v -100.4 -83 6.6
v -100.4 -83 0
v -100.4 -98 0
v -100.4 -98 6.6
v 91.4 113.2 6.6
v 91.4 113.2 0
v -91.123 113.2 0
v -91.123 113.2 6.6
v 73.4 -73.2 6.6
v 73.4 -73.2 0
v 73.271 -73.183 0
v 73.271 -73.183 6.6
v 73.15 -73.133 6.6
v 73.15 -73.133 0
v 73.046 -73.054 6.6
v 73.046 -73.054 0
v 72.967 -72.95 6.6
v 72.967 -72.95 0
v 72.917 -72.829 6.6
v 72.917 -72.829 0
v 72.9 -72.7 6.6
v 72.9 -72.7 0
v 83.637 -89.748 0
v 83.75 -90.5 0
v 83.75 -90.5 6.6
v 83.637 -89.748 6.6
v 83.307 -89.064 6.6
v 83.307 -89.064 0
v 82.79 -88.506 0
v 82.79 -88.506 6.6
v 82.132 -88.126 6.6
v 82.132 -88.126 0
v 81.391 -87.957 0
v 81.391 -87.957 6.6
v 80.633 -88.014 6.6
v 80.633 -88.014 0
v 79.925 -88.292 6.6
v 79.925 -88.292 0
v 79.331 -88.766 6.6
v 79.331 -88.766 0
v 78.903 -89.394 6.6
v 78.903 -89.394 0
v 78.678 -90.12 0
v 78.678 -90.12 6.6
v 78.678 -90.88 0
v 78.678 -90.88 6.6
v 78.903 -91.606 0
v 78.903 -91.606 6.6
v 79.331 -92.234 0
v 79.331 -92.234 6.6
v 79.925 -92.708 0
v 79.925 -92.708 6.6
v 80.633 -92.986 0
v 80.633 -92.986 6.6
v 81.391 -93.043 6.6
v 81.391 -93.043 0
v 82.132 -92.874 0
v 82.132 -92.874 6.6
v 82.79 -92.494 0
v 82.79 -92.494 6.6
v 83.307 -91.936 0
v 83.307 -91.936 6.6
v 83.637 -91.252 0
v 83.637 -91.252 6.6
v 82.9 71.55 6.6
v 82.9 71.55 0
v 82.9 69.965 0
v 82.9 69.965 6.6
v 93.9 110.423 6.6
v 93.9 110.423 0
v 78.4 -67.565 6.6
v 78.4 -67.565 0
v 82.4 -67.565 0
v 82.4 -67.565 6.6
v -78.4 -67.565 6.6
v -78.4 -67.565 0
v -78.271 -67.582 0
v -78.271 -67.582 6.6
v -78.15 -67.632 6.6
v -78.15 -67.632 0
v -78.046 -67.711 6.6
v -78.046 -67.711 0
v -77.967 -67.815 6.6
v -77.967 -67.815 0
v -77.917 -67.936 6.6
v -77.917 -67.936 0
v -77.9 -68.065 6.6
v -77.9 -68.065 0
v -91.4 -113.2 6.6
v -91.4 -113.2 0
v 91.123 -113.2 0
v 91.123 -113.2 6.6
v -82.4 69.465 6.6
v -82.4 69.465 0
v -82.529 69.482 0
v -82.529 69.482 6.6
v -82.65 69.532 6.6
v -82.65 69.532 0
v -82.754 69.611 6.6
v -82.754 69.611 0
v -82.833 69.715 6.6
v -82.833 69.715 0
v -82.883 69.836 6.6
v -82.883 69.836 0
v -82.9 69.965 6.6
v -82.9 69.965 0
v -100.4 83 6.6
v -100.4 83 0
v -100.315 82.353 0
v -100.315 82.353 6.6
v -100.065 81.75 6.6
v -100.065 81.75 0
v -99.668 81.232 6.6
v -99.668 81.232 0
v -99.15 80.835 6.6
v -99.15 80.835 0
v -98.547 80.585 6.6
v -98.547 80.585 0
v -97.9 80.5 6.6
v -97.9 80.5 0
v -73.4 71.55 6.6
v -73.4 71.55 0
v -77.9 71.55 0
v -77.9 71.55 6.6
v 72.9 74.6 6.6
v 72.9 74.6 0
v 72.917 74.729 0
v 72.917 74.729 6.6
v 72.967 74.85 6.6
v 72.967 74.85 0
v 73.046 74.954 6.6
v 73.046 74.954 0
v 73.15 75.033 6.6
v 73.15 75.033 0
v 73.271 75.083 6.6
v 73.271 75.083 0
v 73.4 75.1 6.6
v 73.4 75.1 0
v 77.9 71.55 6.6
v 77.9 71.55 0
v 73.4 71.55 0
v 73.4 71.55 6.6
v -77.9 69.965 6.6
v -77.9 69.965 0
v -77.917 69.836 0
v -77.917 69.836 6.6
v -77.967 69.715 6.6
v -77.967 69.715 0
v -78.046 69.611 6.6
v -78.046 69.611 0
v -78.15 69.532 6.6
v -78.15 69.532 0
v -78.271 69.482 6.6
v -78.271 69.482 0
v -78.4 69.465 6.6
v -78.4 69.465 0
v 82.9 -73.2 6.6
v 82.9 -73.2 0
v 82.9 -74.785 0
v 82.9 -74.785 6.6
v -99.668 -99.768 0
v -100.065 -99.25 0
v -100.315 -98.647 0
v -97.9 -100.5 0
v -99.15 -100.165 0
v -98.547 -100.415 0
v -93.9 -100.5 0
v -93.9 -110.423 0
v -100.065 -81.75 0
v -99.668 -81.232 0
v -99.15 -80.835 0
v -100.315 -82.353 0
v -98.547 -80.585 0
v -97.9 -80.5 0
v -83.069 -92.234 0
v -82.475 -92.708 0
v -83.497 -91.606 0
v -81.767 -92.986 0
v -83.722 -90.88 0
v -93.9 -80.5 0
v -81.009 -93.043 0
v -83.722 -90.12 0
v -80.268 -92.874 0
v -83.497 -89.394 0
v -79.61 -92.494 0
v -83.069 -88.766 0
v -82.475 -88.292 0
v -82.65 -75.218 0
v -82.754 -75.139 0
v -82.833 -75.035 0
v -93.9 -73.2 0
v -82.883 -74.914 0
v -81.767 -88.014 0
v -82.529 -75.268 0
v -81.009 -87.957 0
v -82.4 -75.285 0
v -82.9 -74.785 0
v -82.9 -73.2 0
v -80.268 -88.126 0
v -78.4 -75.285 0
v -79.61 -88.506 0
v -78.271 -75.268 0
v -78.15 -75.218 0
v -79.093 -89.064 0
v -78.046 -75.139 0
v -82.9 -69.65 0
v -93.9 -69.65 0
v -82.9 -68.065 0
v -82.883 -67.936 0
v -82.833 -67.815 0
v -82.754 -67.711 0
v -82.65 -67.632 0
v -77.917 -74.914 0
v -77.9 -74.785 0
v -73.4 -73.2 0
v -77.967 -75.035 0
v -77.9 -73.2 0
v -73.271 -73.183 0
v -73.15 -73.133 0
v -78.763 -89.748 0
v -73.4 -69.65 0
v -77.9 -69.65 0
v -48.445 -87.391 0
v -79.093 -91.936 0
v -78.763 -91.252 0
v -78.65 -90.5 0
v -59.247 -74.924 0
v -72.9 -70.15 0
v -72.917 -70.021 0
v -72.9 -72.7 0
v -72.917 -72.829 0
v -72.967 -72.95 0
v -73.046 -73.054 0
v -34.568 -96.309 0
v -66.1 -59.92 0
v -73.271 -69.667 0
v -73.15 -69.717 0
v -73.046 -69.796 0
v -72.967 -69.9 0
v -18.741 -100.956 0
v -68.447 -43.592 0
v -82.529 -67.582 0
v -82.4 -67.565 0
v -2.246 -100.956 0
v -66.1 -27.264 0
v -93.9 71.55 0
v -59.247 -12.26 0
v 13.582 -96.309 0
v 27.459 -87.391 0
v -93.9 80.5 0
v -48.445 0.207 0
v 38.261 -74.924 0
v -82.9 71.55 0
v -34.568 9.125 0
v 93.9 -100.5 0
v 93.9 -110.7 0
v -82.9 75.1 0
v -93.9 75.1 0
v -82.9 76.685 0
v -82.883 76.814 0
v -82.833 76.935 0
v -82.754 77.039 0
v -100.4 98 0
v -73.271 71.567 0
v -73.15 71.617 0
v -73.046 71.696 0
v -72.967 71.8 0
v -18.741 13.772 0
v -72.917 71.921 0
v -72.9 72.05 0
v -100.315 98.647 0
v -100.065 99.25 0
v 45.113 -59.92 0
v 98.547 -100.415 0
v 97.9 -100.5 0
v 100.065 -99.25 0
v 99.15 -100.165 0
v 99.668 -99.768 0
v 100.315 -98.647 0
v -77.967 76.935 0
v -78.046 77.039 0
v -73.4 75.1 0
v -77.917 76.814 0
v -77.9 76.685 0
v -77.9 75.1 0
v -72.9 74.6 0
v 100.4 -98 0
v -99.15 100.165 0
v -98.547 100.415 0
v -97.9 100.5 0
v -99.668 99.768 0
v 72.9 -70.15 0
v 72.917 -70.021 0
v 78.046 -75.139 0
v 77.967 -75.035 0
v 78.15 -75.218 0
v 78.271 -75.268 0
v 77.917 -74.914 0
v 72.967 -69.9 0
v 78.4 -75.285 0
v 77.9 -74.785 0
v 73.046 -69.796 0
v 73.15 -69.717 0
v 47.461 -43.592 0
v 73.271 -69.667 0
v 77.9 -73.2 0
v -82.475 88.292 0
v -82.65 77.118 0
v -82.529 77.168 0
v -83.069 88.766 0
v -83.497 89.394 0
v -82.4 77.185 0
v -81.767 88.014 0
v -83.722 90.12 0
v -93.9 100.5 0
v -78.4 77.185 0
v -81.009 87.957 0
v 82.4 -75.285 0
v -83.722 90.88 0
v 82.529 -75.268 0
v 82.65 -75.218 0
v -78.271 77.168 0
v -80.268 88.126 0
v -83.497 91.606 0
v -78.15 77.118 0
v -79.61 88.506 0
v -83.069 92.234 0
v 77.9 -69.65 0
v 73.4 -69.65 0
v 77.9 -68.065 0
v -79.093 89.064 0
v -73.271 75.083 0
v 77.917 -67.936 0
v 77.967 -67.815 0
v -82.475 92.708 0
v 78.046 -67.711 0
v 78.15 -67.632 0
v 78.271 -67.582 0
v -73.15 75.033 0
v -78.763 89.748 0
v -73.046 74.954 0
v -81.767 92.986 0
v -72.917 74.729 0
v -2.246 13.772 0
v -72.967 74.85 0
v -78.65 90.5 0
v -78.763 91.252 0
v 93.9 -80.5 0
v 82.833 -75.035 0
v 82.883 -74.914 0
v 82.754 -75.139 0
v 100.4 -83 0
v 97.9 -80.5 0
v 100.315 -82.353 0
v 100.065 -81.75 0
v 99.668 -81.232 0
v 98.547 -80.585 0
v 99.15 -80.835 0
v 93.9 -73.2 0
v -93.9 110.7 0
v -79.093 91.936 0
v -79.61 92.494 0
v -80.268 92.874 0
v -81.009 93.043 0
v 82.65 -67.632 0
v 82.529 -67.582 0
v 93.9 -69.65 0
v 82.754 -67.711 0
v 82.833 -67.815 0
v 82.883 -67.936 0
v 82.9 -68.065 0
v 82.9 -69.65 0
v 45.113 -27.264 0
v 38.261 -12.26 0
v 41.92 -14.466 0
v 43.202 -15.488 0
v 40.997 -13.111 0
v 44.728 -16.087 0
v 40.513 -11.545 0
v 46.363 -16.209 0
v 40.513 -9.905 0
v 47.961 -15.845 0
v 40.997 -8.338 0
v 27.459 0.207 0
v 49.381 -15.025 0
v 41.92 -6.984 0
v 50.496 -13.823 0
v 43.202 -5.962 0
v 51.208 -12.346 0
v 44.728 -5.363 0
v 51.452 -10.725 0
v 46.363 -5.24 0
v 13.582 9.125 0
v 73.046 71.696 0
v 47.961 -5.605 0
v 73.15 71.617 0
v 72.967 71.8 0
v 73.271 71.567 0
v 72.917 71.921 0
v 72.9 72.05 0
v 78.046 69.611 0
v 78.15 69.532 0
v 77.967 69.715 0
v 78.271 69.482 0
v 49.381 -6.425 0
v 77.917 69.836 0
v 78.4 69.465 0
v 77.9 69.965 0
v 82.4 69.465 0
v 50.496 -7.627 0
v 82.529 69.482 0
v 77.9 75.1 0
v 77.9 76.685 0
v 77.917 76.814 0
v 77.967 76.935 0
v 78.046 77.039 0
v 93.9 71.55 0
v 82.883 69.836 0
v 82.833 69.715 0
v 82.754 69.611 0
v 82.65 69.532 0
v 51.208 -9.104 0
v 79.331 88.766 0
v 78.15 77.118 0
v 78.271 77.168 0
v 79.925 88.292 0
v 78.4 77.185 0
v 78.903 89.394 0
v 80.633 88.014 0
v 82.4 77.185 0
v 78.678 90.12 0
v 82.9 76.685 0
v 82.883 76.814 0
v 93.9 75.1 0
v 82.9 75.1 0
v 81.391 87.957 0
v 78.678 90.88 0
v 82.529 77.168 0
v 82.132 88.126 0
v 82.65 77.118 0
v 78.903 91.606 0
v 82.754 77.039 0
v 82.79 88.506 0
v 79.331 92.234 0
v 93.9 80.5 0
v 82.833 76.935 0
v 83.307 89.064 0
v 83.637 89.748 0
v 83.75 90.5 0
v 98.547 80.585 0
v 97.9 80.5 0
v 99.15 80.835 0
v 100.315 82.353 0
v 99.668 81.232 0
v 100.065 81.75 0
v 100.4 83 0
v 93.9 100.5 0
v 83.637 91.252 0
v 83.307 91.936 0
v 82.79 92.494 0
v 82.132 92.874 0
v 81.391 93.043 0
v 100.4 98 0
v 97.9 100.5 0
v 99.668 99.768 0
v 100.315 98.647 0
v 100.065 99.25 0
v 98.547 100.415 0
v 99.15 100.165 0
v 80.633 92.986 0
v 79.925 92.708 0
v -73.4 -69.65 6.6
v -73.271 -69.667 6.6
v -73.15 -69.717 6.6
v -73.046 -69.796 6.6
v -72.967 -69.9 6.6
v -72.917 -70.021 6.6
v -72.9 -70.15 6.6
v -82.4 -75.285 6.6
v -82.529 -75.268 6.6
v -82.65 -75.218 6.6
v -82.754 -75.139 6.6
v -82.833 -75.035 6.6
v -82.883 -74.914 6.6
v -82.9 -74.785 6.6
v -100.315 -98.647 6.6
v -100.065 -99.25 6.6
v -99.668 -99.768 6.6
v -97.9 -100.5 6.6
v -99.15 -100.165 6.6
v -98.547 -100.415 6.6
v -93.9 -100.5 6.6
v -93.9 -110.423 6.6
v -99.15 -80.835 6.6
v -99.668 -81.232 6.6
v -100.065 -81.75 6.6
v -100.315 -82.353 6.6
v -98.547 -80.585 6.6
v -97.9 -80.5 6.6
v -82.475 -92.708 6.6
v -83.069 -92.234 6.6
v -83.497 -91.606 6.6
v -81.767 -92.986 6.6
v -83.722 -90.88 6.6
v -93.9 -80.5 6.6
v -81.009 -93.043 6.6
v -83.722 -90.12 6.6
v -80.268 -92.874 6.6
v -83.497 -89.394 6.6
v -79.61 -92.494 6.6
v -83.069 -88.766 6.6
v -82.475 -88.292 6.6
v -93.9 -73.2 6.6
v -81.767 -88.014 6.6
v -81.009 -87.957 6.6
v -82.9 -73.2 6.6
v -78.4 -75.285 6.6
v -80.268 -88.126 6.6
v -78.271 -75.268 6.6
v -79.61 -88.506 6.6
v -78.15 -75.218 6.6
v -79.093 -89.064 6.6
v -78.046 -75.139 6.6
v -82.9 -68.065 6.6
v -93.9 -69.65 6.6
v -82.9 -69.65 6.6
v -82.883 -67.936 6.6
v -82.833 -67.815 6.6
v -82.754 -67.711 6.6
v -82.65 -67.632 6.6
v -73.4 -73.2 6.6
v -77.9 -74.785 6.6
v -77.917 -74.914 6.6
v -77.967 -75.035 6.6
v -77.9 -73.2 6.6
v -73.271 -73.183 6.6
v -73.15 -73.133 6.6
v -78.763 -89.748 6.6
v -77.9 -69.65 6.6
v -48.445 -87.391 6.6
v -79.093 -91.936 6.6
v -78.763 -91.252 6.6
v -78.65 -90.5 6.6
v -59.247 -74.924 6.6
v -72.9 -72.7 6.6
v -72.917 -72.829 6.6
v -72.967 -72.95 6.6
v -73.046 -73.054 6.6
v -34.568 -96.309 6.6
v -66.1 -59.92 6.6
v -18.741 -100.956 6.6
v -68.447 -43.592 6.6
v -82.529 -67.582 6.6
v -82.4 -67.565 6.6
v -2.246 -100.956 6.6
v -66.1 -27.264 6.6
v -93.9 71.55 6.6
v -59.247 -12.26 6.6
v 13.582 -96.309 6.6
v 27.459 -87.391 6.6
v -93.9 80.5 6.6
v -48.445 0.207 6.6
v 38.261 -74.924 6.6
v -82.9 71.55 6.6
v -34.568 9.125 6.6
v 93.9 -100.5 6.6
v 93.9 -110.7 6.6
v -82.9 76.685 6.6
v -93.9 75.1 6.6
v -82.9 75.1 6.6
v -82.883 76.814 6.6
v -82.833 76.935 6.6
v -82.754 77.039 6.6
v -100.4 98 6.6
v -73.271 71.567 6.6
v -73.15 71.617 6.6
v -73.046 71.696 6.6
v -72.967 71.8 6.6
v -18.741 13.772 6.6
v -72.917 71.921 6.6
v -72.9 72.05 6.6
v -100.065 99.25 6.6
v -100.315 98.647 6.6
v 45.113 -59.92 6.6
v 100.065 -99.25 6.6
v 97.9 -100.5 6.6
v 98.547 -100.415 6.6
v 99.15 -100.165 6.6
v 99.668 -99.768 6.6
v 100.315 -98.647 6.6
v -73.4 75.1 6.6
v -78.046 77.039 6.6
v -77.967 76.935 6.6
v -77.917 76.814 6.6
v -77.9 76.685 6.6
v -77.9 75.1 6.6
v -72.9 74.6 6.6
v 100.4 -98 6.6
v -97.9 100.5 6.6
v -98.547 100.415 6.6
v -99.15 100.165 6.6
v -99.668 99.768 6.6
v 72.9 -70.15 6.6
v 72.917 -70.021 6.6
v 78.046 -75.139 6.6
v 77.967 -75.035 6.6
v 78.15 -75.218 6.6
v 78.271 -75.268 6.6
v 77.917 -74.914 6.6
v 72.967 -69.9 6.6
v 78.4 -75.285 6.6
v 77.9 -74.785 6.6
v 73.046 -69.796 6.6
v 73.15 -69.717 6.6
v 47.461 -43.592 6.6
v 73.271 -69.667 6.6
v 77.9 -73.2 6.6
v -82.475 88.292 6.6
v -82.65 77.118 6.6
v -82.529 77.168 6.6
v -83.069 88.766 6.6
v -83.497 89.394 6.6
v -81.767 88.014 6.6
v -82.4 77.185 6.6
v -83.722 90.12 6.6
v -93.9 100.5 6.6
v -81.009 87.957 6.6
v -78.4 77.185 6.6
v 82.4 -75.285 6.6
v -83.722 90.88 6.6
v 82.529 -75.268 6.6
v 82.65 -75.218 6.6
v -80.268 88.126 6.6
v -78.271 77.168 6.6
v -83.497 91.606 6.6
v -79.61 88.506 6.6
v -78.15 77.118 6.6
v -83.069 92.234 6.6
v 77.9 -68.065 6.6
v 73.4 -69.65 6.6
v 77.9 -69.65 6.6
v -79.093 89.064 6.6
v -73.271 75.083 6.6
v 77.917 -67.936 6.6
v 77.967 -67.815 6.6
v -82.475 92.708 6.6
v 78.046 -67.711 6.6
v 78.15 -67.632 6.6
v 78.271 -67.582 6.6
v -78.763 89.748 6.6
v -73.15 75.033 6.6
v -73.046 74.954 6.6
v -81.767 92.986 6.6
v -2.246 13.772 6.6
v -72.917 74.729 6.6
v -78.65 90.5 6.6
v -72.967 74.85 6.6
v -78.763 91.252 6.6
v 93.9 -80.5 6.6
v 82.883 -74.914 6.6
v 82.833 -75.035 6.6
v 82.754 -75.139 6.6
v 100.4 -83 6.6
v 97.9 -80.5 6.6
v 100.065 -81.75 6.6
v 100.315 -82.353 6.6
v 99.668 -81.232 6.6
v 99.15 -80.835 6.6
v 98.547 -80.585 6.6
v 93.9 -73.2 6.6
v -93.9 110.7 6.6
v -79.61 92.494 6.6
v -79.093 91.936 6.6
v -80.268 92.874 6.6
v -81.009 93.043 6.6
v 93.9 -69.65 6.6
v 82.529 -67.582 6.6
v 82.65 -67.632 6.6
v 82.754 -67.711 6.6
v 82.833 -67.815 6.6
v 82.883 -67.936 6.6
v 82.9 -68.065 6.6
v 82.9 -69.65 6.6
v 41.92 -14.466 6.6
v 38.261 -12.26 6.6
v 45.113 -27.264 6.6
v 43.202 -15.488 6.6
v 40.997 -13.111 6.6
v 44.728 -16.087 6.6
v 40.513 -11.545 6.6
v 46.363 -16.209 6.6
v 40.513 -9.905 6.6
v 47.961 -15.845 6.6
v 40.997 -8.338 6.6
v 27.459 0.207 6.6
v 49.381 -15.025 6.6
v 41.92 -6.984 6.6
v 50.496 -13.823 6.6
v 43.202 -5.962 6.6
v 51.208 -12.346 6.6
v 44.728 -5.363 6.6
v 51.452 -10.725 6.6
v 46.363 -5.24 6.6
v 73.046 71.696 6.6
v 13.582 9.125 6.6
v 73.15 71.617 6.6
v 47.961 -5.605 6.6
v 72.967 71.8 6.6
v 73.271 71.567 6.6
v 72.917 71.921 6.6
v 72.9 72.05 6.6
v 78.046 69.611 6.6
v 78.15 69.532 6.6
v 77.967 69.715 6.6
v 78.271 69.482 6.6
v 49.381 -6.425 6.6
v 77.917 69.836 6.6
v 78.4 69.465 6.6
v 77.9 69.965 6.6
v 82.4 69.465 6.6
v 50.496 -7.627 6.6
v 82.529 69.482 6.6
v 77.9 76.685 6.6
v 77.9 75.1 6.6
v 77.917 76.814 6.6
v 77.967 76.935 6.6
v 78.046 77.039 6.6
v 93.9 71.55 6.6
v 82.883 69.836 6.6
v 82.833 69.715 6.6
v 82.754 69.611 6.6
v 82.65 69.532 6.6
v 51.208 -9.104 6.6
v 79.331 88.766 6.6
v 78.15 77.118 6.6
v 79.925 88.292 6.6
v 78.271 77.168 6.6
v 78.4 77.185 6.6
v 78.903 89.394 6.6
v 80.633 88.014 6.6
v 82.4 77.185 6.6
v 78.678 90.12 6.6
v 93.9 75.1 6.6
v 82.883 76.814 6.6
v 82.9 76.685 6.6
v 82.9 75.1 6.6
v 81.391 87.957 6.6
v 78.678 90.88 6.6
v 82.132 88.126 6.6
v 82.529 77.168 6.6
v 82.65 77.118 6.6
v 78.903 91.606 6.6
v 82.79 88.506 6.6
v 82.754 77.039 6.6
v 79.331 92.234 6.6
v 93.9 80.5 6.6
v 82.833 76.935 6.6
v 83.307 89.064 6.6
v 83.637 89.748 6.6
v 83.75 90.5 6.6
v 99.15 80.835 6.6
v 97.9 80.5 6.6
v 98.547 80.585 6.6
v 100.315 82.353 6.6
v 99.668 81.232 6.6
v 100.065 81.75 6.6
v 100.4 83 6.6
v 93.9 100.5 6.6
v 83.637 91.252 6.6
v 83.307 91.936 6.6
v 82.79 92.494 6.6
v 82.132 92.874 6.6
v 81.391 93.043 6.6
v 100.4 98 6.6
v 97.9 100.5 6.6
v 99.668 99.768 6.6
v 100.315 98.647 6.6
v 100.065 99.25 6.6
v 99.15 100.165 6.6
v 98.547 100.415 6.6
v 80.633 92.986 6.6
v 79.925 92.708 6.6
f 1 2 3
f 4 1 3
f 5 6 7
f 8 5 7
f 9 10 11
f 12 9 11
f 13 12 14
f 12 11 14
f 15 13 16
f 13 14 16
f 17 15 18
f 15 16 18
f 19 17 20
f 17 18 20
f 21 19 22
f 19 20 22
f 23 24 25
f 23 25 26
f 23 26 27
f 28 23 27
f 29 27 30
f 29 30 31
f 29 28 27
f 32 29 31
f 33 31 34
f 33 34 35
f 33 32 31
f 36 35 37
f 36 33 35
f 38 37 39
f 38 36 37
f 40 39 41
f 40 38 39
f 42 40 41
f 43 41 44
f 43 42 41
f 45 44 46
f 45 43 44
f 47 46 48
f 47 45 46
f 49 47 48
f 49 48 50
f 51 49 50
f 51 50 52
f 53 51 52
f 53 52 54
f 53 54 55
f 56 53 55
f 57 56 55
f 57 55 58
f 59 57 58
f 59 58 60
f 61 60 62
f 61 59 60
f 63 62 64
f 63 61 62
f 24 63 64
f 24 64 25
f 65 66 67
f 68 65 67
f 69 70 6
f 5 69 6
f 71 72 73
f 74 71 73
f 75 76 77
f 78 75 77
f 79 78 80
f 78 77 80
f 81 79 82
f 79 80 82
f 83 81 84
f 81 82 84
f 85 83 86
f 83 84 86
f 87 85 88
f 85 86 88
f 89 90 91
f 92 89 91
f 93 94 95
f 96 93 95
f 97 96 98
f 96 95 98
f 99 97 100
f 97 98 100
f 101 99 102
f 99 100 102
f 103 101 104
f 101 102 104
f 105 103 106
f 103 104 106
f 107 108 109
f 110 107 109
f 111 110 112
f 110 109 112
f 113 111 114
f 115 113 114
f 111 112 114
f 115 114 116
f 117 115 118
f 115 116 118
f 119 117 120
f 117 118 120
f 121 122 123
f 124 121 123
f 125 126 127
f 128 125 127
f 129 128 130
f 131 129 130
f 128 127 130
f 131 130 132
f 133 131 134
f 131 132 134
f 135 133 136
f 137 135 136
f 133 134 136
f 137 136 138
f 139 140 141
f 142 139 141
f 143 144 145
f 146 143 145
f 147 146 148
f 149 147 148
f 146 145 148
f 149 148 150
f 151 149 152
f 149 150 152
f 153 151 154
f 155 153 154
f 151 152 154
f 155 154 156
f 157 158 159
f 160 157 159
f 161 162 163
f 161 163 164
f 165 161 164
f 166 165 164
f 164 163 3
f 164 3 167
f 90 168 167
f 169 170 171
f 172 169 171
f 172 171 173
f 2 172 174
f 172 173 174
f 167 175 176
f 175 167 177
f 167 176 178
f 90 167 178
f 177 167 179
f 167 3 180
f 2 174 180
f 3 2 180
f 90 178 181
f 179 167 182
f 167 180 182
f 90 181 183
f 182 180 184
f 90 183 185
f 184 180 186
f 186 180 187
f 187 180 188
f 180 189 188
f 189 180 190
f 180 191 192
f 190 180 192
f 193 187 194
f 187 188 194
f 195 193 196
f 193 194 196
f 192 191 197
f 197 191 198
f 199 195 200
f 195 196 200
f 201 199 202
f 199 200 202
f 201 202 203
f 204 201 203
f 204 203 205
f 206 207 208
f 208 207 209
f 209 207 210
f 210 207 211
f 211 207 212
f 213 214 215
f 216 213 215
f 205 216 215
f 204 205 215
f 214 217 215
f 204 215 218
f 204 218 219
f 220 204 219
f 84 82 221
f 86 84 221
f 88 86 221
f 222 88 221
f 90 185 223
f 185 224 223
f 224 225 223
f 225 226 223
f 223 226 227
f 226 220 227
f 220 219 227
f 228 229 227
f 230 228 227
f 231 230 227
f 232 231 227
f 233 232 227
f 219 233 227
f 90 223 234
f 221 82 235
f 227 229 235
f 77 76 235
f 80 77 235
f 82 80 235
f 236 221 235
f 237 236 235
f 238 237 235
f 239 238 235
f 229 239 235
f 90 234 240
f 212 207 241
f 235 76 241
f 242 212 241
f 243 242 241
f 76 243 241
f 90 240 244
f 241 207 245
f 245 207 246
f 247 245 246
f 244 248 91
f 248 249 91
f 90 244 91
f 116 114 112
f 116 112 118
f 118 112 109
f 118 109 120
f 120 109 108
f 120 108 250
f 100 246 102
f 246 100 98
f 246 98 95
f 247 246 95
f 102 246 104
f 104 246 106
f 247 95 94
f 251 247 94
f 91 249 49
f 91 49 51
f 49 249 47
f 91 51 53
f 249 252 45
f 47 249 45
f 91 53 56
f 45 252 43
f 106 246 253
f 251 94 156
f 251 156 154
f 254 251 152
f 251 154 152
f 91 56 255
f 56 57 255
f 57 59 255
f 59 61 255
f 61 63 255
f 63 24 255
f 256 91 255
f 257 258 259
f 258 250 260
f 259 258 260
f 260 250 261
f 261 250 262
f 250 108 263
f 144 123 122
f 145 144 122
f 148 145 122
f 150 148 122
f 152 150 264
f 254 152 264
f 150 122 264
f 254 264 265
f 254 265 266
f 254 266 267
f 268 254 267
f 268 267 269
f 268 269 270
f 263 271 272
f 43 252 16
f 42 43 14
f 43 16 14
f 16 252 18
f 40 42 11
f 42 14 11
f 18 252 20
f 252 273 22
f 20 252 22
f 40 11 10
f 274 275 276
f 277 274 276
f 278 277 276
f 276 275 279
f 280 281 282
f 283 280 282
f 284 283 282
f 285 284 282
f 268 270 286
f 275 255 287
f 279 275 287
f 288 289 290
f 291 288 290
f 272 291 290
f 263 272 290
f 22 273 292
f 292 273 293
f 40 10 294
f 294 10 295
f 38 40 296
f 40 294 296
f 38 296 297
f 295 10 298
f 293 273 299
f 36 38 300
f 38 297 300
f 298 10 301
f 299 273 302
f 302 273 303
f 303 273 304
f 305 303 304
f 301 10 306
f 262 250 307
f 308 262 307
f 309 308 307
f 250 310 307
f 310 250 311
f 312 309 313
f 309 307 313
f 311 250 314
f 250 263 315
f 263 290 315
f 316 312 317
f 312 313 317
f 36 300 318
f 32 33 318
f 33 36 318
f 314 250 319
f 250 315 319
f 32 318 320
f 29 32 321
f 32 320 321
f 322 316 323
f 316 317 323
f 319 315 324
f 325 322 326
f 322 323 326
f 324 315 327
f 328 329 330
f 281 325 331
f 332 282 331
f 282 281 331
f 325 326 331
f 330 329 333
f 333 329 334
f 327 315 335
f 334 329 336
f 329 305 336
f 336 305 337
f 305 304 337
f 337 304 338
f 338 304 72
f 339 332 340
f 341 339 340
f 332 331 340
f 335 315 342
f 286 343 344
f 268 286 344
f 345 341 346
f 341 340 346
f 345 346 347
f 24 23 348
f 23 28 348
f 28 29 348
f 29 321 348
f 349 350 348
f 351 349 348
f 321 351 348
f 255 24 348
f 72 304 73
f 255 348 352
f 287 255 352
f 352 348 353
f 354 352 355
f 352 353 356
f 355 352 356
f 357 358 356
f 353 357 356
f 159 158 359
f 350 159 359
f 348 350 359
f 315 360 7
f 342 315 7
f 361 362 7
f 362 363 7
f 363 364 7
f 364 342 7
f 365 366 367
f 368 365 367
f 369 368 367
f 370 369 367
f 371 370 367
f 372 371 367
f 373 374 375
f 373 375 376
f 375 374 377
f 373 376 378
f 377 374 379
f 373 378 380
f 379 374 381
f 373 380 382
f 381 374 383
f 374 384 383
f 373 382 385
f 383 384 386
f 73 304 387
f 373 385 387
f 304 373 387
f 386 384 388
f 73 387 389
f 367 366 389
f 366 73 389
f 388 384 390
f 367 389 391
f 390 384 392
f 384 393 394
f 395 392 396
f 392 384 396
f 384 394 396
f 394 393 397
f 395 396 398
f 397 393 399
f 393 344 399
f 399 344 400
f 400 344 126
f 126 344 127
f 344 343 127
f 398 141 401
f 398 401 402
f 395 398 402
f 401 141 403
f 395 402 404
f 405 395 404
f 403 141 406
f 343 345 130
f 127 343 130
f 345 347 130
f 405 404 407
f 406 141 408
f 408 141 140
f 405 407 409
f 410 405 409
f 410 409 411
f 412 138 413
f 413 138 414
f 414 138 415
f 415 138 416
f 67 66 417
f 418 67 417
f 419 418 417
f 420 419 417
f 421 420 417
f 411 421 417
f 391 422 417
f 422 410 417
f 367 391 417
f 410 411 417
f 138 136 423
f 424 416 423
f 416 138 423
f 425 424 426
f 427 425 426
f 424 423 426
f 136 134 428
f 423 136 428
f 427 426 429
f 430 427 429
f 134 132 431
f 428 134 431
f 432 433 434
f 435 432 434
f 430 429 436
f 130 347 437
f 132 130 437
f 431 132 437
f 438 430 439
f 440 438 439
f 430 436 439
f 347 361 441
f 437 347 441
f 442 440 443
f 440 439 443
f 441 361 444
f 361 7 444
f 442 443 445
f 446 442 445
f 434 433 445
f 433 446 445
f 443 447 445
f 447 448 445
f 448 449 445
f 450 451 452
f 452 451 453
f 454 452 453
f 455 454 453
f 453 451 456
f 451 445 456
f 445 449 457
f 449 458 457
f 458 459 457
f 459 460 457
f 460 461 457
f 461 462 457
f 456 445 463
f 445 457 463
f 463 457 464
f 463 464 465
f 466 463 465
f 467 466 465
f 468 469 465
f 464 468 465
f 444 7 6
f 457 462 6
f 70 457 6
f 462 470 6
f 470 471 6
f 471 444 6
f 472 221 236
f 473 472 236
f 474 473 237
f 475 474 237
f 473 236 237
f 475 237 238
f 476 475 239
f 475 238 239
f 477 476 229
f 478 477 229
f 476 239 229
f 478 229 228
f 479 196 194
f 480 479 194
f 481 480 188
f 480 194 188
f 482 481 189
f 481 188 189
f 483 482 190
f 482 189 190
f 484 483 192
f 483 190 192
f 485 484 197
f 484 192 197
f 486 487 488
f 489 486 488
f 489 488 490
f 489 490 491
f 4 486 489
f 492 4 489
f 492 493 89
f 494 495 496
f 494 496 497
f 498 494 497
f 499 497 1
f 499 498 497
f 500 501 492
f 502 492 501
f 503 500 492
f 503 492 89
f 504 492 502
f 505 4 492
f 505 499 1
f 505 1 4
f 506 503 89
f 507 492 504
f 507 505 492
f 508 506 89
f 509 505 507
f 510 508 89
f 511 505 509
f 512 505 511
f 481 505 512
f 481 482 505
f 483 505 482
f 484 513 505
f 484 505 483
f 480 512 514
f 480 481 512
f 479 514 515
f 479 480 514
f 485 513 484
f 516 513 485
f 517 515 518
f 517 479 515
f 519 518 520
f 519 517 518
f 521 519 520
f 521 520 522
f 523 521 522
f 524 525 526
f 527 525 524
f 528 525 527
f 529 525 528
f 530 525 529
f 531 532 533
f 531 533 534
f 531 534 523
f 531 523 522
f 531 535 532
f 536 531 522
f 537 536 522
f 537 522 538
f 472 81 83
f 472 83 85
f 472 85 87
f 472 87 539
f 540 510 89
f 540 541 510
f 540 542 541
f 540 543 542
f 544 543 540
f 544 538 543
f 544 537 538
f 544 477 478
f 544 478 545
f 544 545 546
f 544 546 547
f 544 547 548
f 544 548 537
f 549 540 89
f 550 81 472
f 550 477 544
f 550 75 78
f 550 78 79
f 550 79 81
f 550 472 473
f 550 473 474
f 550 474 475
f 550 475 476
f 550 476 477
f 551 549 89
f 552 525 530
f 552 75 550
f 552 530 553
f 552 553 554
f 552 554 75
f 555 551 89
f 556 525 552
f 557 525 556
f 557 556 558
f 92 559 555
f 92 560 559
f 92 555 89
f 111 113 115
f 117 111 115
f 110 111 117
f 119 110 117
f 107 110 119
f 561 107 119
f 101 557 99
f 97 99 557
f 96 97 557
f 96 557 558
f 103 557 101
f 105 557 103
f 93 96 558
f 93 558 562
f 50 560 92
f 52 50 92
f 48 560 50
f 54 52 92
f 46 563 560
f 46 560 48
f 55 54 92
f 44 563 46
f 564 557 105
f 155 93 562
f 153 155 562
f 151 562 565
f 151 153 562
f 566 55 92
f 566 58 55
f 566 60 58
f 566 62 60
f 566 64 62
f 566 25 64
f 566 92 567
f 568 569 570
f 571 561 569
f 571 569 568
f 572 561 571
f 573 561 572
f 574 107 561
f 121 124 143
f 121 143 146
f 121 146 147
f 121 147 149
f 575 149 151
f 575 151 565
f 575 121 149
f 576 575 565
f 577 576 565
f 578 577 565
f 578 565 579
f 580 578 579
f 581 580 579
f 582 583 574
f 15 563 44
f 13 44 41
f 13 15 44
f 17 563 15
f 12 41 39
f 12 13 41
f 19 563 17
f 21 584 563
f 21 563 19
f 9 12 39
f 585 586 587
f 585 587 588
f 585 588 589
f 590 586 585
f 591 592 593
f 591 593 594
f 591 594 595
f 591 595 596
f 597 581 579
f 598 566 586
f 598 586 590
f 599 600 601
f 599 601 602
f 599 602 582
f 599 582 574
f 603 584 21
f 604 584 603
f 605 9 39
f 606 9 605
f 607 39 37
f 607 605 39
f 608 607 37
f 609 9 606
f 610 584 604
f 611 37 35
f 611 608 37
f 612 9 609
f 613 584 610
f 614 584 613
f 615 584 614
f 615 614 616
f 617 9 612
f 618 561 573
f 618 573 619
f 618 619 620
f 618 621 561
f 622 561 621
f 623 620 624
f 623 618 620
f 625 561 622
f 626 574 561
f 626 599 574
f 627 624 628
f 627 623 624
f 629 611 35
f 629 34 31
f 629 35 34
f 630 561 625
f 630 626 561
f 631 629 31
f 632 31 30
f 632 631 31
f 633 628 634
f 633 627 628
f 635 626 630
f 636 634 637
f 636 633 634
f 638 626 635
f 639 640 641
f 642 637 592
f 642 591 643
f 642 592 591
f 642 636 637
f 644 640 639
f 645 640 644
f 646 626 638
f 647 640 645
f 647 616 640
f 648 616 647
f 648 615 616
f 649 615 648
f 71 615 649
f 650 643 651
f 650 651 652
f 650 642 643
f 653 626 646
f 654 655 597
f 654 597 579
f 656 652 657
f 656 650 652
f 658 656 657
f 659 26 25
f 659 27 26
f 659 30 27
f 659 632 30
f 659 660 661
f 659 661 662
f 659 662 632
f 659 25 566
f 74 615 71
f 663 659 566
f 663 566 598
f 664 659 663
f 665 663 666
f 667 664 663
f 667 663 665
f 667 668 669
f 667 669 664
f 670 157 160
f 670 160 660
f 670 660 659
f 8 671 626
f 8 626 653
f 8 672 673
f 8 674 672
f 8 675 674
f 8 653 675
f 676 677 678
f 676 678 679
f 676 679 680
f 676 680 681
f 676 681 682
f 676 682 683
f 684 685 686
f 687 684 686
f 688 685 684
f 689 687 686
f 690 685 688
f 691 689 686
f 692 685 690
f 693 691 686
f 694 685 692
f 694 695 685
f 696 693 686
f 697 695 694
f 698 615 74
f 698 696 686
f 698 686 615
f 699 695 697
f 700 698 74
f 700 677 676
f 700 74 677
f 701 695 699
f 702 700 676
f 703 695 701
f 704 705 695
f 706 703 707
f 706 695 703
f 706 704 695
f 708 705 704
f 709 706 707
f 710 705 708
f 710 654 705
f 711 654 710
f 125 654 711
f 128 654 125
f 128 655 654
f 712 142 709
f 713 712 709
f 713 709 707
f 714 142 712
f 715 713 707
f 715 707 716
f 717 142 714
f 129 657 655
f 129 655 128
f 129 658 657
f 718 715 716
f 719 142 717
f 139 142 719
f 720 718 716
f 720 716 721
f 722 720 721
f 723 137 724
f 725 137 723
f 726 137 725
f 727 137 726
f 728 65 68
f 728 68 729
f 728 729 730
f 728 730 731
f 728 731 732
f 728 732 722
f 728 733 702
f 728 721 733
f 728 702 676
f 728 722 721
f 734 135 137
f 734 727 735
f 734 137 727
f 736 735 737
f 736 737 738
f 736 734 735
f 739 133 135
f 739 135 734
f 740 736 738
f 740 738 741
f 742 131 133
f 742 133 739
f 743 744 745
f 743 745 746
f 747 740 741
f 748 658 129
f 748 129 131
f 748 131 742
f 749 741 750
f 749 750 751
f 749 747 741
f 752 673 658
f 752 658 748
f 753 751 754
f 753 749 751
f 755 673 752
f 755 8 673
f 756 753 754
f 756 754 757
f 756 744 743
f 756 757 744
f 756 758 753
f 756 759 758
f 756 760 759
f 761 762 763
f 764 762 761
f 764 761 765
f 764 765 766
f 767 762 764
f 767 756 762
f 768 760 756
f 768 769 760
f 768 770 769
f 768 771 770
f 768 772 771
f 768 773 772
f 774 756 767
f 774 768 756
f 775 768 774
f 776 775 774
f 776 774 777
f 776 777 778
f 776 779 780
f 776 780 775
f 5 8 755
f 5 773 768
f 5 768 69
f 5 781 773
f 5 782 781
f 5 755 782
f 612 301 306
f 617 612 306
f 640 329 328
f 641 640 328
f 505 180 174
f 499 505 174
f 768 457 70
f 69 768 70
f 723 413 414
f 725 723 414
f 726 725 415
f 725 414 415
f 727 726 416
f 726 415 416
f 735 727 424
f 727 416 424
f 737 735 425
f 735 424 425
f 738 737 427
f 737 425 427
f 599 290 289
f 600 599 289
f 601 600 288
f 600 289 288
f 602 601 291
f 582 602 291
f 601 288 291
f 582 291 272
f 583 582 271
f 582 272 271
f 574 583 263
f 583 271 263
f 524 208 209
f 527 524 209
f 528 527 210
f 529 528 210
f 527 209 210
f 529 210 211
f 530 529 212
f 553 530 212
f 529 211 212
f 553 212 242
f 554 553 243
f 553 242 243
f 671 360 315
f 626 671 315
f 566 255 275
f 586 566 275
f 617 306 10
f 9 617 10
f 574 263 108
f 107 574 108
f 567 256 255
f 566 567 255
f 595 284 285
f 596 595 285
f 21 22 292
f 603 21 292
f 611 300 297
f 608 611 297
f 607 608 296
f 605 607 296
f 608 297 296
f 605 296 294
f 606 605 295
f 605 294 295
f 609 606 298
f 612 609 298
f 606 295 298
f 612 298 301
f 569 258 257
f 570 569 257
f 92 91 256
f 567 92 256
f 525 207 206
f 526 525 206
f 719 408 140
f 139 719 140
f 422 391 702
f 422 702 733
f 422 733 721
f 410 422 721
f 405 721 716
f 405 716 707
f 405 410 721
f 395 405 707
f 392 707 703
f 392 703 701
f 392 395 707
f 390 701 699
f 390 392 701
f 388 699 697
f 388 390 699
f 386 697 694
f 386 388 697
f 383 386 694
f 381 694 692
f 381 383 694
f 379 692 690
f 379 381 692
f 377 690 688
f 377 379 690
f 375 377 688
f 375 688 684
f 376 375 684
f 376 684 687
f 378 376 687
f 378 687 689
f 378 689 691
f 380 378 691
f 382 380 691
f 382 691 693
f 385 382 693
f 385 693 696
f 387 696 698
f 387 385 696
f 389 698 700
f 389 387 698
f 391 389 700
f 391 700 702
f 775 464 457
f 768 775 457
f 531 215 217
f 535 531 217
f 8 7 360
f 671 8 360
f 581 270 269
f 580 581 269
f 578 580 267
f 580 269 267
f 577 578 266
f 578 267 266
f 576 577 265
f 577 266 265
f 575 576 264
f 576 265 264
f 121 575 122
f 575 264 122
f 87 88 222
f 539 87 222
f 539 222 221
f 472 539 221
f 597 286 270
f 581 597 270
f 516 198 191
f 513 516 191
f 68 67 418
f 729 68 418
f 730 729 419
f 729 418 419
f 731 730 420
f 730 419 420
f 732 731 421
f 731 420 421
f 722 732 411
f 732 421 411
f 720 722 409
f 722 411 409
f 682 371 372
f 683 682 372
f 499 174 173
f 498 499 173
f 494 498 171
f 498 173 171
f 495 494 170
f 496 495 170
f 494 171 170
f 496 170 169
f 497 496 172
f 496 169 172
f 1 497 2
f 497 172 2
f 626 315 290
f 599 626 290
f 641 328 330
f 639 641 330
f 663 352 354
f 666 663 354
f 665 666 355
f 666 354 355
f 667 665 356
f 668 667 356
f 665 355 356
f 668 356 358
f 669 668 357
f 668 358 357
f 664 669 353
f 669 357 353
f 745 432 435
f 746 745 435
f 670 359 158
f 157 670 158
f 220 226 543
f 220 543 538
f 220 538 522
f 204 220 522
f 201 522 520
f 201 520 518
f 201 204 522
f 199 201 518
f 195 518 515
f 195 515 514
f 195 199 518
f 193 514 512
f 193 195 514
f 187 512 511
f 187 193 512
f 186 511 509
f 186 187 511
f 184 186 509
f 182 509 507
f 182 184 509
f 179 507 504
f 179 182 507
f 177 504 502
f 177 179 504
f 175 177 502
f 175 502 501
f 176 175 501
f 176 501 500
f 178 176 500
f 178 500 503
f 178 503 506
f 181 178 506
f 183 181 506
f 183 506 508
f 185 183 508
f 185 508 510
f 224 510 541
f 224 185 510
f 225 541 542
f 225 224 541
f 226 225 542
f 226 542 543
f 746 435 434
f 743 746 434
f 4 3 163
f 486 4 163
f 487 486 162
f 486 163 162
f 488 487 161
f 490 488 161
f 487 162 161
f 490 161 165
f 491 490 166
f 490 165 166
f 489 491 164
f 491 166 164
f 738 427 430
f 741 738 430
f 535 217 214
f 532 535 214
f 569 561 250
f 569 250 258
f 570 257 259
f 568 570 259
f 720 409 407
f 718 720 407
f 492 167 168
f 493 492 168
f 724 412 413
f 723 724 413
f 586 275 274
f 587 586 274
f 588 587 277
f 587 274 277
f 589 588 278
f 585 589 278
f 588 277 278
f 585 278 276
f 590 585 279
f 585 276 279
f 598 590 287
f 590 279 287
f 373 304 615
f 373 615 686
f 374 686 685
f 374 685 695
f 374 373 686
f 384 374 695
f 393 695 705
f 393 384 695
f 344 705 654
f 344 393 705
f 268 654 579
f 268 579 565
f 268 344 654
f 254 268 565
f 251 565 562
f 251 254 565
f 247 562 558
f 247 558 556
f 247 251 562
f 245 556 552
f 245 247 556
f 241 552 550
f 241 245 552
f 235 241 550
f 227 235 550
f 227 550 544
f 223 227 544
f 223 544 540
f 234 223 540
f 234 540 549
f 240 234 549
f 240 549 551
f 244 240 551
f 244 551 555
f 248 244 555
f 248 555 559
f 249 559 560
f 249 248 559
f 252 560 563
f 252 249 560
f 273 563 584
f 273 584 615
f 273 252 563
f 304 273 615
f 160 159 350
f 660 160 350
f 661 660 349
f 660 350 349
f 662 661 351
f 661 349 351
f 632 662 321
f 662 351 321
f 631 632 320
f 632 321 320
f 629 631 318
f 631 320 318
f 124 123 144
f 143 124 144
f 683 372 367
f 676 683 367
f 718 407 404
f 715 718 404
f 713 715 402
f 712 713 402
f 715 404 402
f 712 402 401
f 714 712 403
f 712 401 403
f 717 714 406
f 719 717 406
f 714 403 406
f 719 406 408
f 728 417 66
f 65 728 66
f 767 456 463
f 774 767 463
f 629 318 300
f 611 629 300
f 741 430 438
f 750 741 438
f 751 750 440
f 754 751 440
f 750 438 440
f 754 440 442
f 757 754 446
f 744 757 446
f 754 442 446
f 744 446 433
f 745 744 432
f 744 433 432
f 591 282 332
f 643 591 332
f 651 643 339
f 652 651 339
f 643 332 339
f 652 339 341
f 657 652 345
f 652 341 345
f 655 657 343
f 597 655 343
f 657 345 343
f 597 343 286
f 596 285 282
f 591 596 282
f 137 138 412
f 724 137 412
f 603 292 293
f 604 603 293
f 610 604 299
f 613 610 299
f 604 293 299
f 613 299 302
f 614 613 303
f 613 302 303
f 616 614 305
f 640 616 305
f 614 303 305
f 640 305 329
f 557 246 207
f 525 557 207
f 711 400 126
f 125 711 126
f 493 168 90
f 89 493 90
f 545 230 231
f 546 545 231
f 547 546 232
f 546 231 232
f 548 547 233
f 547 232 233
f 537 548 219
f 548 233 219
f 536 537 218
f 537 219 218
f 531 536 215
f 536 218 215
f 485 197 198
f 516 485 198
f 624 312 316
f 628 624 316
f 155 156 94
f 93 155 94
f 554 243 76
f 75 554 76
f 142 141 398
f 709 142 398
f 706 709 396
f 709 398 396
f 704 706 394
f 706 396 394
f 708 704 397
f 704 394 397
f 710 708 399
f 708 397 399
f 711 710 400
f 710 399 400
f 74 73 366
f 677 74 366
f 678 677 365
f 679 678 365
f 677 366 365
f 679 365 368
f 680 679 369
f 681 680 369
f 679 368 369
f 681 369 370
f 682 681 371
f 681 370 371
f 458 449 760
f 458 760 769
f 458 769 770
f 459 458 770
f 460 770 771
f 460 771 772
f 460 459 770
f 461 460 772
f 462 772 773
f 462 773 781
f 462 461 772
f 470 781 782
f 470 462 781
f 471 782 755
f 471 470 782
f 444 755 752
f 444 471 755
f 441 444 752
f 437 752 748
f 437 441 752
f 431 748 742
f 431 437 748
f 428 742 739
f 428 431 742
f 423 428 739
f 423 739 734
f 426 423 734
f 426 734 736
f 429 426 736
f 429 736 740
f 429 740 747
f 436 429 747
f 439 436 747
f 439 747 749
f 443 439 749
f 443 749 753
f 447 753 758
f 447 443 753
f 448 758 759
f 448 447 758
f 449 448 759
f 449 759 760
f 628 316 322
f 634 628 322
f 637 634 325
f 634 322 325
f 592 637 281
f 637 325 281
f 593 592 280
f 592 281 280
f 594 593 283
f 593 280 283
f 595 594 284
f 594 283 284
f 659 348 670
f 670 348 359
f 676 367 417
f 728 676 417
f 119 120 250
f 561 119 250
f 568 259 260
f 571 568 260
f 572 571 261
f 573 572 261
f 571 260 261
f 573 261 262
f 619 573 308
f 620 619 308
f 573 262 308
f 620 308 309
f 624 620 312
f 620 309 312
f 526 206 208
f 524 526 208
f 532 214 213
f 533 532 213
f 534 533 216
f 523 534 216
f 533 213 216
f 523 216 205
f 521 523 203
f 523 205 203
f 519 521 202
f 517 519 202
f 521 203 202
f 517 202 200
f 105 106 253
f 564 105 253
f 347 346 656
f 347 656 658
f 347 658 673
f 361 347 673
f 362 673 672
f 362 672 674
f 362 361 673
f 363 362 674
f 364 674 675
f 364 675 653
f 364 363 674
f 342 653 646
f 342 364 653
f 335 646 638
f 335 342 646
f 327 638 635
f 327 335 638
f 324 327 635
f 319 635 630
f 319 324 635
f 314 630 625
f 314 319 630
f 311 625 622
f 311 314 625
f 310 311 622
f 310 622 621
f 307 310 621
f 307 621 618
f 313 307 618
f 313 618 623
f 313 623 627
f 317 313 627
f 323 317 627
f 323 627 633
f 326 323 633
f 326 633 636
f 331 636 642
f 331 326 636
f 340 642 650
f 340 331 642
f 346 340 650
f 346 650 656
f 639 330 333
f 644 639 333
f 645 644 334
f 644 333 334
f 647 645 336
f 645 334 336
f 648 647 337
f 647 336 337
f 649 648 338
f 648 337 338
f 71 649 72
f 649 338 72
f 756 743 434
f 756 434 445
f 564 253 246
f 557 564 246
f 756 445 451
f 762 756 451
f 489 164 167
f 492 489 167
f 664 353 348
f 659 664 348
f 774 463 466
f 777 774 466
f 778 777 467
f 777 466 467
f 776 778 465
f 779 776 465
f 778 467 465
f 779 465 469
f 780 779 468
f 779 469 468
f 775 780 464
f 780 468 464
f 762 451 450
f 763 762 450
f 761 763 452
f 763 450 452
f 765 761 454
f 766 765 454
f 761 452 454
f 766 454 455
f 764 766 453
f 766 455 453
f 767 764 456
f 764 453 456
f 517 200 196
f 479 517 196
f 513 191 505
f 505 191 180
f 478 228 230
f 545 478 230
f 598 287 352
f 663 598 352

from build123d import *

# Parameters (mm, degrees)
MODEL_R             = 57.954171366
MODEL_R_2           = 2.55
MODEL_R_3           = 5.5
BOSS_EXTRUDE1_DEPTH = 6.6


with BuildPart() as part:
    # Model → Boss-Extrude1 (new body)
    with BuildSketch(Plane.XY):
        with BuildLine():
            Line((93.9, 110.423468713), (91.4, 113.2))
            Line((91.4, 113.2), (-91.123468713, 113.2))
            Line((-91.123468713, 113.2), (-93.9, 110.7))
            Line((-93.9, 110.7), (-93.9, 100.5))
            Line((-93.9, 100.5), (-97.9, 100.5))
            ThreePointArc((-97.9, 100.5), (-99.667766953, 99.767766953), (-100.4, 98))
            Line((-100.4, 98), (-100.4, 83))
            ThreePointArc((-100.4, 83), (-99.667766953, 81.232233047), (-97.9, 80.5))
            Line((-97.9, 80.5), (-93.9, 80.5))
            Line((-93.9, 80.5), (-93.9, 75.1))
            Line((-93.9, 75.1), (-82.9, 75.1))
            Line((-82.9, 75.1), (-82.9, 76.685))
            ThreePointArc((-82.9, 76.685), (-82.753553391, 77.038553391), (-82.4, 77.185))
            Line((-82.4, 77.185), (-78.4, 77.185))
            ThreePointArc((-78.4, 77.185), (-78.046446609, 77.038553391), (-77.9, 76.685))
            Line((-77.9, 76.685), (-77.9, 75.1))
            Line((-77.9, 75.1), (-73.4, 75.1))
            ThreePointArc((-73.4, 75.1), (-73.046446609, 74.953553391), (-72.9, 74.6))
            Line((-72.9, 74.6), (-72.9, 72.05))
            ThreePointArc((-72.9, 72.05), (-73.046446609, 71.696446609), (-73.4, 71.55))
            Line((-73.4, 71.55), (-77.9, 71.55))
            Line((-77.9, 71.55), (-77.9, 69.965))
            ThreePointArc((-77.9, 69.965), (-78.046446609, 69.611446609), (-78.4, 69.465))
            Line((-78.4, 69.465), (-82.4, 69.465))
            ThreePointArc((-82.4, 69.465), (-82.753553391, 69.611446609), (-82.9, 69.965))
            Line((-82.9, 69.965), (-82.9, 71.55))
            Line((-82.9, 71.55), (-93.9, 71.55))
            Line((-93.9, 71.55), (-93.9, -69.65))
            Line((-93.9, -69.65), (-82.9, -69.65))
            Line((-82.9, -69.65), (-82.9, -68.065))
            ThreePointArc((-82.9, -68.065), (-82.753553391, -67.711446609), (-82.4, -67.565))
            Line((-82.4, -67.565), (-78.4, -67.565))
            ThreePointArc((-78.4, -67.565), (-78.046446609, -67.711446609), (-77.9, -68.065))
            Line((-77.9, -68.065), (-77.9, -69.65))
            Line((-77.9, -69.65), (-73.4, -69.65))
            ThreePointArc((-73.4, -69.65), (-73.046446609, -69.796446609), (-72.9, -70.15))
            Line((-72.9, -70.15), (-72.9, -72.7))
            ThreePointArc((-72.9, -72.7), (-73.046446609, -73.053553391), (-73.4, -73.2))
            Line((-73.4, -73.2), (-77.9, -73.2))
            Line((-77.9, -73.2), (-77.9, -74.785))
            ThreePointArc((-77.9, -74.785), (-78.046446609, -75.138553391), (-78.4, -75.285))
            Line((-78.4, -75.285), (-82.4, -75.285))
            ThreePointArc((-82.4, -75.285), (-82.753553391, -75.138553391), (-82.9, -74.785))
            Line((-82.9, -74.785), (-82.9, -73.2))
            Line((-82.9, -73.2), (-93.9, -73.2))
            Line((-93.9, -73.2), (-93.9, -80.5))
            Line((-93.9, -80.5), (-97.9, -80.5))
            ThreePointArc((-97.9, -80.5), (-99.667766953, -81.232233047), (-100.4, -83))
            Line((-100.4, -83), (-100.4, -98))
            ThreePointArc((-100.4, -98), (-99.667766953, -99.767766953), (-97.9, -100.5))
            Line((-97.9, -100.5), (-93.9, -100.5))
            Line((-93.9, -100.5), (-93.9, -110.423468713))
            Line((-93.9, -110.423468713), (-91.4, -113.2))
            Line((-91.4, -113.2), (91.123468713, -113.2))
            Line((91.123468713, -113.2), (93.9, -110.7))
            Line((93.9, -110.7), (93.9, -100.5))
            Line((93.9, -100.5), (97.9, -100.5))
            ThreePointArc((97.9, -100.5), (99.667766953, -99.767766953), (100.4, -98))
            Line((100.4, -98), (100.4, -83))
            ThreePointArc((100.4, -83), (99.667766953, -81.232233047), (97.9, -80.5))
            Line((97.9, -80.5), (93.9, -80.5))
            Line((93.9, -80.5), (93.9, -73.2))
            Line((93.9, -73.2), (82.9, -73.2))
            Line((82.9, -73.2), (82.9, -74.785))
            ThreePointArc((82.9, -74.785), (82.753553391, -75.138553391), (82.4, -75.285))
            Line((82.4, -75.285), (78.4, -75.285))
            ThreePointArc((78.4, -75.285), (78.046446609, -75.138553391), (77.9, -74.785))
            Line((77.9, -74.785), (77.9, -73.2))
            Line((77.9, -73.2), (73.4, -73.2))
            ThreePointArc((73.4, -73.2), (73.046446609, -73.053553391), (72.9, -72.7))
            Line((72.9, -72.7), (72.9, -70.15))
            ThreePointArc((72.9, -70.15), (73.046446609, -69.796446609), (73.4, -69.65))
            Line((73.4, -69.65), (77.9, -69.65))
            Line((77.9, -69.65), (77.9, -68.065))
            ThreePointArc((77.9, -68.065), (78.046446609, -67.711446609), (78.4, -67.565))
            Line((78.4, -67.565), (82.4, -67.565))
            ThreePointArc((82.4, -67.565), (82.753553391, -67.711446609), (82.9, -68.065))
            Line((82.9, -68.065), (82.9, -69.65))
            Line((82.9, -69.65), (93.9, -69.65))
            Line((93.9, -69.65), (93.9, 71.55))
            Line((93.9, 71.55), (82.9, 71.55))
            Line((82.9, 71.55), (82.9, 69.965))
            ThreePointArc((82.9, 69.965), (82.753553391, 69.611446609), (82.4, 69.465))
            Line((82.4, 69.465), (78.4, 69.465))
            ThreePointArc((78.4, 69.465), (78.046446609, 69.611446609), (77.9, 69.965))
            Line((77.9, 69.965), (77.9, 71.55))
            Line((77.9, 71.55), (73.4, 71.55))
            ThreePointArc((73.4, 71.55), (73.046446609, 71.696446609), (72.9, 72.05))
            Line((72.9, 72.05), (72.9, 74.6))
            ThreePointArc((72.9, 74.6), (73.046446609, 74.953553391), (73.4, 75.1))
            Line((73.4, 75.1), (77.9, 75.1))
            Line((77.9, 75.1), (77.9, 76.685))
            ThreePointArc((77.9, 76.685), (78.046446609, 77.038553391), (78.4, 77.185))
            Line((78.4, 77.185), (82.4, 77.185))
            ThreePointArc((82.4, 77.185), (82.753553391, 77.038553391), (82.9, 76.685))
            Line((82.9, 76.685), (82.9, 75.1))
            Line((82.9, 75.1), (93.9, 75.1))
            Line((93.9, 75.1), (93.9, 80.5))
            Line((93.9, 80.5), (97.9, 80.5))
            ThreePointArc((97.9, 80.5), (99.667766953, 81.232233047), (100.4, 83))
            Line((100.4, 83), (100.4, 98))
            ThreePointArc((100.4, 98), (99.667766953, 99.767766953), (97.9, 100.5))
            Line((97.9, 100.5), (93.9, 100.5))
            Line((93.9, 100.5), (93.9, 110.423468713))
        make_face()
        with Locations((-10.493238984, -43.592)):
            Circle(MODEL_R, mode=Mode.SUBTRACT)
        with Locations((81.2, -90.5)):
            Circle(MODEL_R_2, mode=Mode.SUBTRACT)
        with Locations((81.2, 90.5)):
            Circle(MODEL_R_2, mode=Mode.SUBTRACT)
        with Locations((-81.2, 90.5)):
            Circle(MODEL_R_2, mode=Mode.SUBTRACT)
        with Locations((-81.2, -90.5)):
            Circle(MODEL_R_2, mode=Mode.SUBTRACT)
        with Locations((45.952001664, -10.724806781)):
            Circle(MODEL_R_3, mode=Mode.SUBTRACT)
    extrude(amount=BOSS_EXTRUDE1_DEPTH)


solid = part.part
